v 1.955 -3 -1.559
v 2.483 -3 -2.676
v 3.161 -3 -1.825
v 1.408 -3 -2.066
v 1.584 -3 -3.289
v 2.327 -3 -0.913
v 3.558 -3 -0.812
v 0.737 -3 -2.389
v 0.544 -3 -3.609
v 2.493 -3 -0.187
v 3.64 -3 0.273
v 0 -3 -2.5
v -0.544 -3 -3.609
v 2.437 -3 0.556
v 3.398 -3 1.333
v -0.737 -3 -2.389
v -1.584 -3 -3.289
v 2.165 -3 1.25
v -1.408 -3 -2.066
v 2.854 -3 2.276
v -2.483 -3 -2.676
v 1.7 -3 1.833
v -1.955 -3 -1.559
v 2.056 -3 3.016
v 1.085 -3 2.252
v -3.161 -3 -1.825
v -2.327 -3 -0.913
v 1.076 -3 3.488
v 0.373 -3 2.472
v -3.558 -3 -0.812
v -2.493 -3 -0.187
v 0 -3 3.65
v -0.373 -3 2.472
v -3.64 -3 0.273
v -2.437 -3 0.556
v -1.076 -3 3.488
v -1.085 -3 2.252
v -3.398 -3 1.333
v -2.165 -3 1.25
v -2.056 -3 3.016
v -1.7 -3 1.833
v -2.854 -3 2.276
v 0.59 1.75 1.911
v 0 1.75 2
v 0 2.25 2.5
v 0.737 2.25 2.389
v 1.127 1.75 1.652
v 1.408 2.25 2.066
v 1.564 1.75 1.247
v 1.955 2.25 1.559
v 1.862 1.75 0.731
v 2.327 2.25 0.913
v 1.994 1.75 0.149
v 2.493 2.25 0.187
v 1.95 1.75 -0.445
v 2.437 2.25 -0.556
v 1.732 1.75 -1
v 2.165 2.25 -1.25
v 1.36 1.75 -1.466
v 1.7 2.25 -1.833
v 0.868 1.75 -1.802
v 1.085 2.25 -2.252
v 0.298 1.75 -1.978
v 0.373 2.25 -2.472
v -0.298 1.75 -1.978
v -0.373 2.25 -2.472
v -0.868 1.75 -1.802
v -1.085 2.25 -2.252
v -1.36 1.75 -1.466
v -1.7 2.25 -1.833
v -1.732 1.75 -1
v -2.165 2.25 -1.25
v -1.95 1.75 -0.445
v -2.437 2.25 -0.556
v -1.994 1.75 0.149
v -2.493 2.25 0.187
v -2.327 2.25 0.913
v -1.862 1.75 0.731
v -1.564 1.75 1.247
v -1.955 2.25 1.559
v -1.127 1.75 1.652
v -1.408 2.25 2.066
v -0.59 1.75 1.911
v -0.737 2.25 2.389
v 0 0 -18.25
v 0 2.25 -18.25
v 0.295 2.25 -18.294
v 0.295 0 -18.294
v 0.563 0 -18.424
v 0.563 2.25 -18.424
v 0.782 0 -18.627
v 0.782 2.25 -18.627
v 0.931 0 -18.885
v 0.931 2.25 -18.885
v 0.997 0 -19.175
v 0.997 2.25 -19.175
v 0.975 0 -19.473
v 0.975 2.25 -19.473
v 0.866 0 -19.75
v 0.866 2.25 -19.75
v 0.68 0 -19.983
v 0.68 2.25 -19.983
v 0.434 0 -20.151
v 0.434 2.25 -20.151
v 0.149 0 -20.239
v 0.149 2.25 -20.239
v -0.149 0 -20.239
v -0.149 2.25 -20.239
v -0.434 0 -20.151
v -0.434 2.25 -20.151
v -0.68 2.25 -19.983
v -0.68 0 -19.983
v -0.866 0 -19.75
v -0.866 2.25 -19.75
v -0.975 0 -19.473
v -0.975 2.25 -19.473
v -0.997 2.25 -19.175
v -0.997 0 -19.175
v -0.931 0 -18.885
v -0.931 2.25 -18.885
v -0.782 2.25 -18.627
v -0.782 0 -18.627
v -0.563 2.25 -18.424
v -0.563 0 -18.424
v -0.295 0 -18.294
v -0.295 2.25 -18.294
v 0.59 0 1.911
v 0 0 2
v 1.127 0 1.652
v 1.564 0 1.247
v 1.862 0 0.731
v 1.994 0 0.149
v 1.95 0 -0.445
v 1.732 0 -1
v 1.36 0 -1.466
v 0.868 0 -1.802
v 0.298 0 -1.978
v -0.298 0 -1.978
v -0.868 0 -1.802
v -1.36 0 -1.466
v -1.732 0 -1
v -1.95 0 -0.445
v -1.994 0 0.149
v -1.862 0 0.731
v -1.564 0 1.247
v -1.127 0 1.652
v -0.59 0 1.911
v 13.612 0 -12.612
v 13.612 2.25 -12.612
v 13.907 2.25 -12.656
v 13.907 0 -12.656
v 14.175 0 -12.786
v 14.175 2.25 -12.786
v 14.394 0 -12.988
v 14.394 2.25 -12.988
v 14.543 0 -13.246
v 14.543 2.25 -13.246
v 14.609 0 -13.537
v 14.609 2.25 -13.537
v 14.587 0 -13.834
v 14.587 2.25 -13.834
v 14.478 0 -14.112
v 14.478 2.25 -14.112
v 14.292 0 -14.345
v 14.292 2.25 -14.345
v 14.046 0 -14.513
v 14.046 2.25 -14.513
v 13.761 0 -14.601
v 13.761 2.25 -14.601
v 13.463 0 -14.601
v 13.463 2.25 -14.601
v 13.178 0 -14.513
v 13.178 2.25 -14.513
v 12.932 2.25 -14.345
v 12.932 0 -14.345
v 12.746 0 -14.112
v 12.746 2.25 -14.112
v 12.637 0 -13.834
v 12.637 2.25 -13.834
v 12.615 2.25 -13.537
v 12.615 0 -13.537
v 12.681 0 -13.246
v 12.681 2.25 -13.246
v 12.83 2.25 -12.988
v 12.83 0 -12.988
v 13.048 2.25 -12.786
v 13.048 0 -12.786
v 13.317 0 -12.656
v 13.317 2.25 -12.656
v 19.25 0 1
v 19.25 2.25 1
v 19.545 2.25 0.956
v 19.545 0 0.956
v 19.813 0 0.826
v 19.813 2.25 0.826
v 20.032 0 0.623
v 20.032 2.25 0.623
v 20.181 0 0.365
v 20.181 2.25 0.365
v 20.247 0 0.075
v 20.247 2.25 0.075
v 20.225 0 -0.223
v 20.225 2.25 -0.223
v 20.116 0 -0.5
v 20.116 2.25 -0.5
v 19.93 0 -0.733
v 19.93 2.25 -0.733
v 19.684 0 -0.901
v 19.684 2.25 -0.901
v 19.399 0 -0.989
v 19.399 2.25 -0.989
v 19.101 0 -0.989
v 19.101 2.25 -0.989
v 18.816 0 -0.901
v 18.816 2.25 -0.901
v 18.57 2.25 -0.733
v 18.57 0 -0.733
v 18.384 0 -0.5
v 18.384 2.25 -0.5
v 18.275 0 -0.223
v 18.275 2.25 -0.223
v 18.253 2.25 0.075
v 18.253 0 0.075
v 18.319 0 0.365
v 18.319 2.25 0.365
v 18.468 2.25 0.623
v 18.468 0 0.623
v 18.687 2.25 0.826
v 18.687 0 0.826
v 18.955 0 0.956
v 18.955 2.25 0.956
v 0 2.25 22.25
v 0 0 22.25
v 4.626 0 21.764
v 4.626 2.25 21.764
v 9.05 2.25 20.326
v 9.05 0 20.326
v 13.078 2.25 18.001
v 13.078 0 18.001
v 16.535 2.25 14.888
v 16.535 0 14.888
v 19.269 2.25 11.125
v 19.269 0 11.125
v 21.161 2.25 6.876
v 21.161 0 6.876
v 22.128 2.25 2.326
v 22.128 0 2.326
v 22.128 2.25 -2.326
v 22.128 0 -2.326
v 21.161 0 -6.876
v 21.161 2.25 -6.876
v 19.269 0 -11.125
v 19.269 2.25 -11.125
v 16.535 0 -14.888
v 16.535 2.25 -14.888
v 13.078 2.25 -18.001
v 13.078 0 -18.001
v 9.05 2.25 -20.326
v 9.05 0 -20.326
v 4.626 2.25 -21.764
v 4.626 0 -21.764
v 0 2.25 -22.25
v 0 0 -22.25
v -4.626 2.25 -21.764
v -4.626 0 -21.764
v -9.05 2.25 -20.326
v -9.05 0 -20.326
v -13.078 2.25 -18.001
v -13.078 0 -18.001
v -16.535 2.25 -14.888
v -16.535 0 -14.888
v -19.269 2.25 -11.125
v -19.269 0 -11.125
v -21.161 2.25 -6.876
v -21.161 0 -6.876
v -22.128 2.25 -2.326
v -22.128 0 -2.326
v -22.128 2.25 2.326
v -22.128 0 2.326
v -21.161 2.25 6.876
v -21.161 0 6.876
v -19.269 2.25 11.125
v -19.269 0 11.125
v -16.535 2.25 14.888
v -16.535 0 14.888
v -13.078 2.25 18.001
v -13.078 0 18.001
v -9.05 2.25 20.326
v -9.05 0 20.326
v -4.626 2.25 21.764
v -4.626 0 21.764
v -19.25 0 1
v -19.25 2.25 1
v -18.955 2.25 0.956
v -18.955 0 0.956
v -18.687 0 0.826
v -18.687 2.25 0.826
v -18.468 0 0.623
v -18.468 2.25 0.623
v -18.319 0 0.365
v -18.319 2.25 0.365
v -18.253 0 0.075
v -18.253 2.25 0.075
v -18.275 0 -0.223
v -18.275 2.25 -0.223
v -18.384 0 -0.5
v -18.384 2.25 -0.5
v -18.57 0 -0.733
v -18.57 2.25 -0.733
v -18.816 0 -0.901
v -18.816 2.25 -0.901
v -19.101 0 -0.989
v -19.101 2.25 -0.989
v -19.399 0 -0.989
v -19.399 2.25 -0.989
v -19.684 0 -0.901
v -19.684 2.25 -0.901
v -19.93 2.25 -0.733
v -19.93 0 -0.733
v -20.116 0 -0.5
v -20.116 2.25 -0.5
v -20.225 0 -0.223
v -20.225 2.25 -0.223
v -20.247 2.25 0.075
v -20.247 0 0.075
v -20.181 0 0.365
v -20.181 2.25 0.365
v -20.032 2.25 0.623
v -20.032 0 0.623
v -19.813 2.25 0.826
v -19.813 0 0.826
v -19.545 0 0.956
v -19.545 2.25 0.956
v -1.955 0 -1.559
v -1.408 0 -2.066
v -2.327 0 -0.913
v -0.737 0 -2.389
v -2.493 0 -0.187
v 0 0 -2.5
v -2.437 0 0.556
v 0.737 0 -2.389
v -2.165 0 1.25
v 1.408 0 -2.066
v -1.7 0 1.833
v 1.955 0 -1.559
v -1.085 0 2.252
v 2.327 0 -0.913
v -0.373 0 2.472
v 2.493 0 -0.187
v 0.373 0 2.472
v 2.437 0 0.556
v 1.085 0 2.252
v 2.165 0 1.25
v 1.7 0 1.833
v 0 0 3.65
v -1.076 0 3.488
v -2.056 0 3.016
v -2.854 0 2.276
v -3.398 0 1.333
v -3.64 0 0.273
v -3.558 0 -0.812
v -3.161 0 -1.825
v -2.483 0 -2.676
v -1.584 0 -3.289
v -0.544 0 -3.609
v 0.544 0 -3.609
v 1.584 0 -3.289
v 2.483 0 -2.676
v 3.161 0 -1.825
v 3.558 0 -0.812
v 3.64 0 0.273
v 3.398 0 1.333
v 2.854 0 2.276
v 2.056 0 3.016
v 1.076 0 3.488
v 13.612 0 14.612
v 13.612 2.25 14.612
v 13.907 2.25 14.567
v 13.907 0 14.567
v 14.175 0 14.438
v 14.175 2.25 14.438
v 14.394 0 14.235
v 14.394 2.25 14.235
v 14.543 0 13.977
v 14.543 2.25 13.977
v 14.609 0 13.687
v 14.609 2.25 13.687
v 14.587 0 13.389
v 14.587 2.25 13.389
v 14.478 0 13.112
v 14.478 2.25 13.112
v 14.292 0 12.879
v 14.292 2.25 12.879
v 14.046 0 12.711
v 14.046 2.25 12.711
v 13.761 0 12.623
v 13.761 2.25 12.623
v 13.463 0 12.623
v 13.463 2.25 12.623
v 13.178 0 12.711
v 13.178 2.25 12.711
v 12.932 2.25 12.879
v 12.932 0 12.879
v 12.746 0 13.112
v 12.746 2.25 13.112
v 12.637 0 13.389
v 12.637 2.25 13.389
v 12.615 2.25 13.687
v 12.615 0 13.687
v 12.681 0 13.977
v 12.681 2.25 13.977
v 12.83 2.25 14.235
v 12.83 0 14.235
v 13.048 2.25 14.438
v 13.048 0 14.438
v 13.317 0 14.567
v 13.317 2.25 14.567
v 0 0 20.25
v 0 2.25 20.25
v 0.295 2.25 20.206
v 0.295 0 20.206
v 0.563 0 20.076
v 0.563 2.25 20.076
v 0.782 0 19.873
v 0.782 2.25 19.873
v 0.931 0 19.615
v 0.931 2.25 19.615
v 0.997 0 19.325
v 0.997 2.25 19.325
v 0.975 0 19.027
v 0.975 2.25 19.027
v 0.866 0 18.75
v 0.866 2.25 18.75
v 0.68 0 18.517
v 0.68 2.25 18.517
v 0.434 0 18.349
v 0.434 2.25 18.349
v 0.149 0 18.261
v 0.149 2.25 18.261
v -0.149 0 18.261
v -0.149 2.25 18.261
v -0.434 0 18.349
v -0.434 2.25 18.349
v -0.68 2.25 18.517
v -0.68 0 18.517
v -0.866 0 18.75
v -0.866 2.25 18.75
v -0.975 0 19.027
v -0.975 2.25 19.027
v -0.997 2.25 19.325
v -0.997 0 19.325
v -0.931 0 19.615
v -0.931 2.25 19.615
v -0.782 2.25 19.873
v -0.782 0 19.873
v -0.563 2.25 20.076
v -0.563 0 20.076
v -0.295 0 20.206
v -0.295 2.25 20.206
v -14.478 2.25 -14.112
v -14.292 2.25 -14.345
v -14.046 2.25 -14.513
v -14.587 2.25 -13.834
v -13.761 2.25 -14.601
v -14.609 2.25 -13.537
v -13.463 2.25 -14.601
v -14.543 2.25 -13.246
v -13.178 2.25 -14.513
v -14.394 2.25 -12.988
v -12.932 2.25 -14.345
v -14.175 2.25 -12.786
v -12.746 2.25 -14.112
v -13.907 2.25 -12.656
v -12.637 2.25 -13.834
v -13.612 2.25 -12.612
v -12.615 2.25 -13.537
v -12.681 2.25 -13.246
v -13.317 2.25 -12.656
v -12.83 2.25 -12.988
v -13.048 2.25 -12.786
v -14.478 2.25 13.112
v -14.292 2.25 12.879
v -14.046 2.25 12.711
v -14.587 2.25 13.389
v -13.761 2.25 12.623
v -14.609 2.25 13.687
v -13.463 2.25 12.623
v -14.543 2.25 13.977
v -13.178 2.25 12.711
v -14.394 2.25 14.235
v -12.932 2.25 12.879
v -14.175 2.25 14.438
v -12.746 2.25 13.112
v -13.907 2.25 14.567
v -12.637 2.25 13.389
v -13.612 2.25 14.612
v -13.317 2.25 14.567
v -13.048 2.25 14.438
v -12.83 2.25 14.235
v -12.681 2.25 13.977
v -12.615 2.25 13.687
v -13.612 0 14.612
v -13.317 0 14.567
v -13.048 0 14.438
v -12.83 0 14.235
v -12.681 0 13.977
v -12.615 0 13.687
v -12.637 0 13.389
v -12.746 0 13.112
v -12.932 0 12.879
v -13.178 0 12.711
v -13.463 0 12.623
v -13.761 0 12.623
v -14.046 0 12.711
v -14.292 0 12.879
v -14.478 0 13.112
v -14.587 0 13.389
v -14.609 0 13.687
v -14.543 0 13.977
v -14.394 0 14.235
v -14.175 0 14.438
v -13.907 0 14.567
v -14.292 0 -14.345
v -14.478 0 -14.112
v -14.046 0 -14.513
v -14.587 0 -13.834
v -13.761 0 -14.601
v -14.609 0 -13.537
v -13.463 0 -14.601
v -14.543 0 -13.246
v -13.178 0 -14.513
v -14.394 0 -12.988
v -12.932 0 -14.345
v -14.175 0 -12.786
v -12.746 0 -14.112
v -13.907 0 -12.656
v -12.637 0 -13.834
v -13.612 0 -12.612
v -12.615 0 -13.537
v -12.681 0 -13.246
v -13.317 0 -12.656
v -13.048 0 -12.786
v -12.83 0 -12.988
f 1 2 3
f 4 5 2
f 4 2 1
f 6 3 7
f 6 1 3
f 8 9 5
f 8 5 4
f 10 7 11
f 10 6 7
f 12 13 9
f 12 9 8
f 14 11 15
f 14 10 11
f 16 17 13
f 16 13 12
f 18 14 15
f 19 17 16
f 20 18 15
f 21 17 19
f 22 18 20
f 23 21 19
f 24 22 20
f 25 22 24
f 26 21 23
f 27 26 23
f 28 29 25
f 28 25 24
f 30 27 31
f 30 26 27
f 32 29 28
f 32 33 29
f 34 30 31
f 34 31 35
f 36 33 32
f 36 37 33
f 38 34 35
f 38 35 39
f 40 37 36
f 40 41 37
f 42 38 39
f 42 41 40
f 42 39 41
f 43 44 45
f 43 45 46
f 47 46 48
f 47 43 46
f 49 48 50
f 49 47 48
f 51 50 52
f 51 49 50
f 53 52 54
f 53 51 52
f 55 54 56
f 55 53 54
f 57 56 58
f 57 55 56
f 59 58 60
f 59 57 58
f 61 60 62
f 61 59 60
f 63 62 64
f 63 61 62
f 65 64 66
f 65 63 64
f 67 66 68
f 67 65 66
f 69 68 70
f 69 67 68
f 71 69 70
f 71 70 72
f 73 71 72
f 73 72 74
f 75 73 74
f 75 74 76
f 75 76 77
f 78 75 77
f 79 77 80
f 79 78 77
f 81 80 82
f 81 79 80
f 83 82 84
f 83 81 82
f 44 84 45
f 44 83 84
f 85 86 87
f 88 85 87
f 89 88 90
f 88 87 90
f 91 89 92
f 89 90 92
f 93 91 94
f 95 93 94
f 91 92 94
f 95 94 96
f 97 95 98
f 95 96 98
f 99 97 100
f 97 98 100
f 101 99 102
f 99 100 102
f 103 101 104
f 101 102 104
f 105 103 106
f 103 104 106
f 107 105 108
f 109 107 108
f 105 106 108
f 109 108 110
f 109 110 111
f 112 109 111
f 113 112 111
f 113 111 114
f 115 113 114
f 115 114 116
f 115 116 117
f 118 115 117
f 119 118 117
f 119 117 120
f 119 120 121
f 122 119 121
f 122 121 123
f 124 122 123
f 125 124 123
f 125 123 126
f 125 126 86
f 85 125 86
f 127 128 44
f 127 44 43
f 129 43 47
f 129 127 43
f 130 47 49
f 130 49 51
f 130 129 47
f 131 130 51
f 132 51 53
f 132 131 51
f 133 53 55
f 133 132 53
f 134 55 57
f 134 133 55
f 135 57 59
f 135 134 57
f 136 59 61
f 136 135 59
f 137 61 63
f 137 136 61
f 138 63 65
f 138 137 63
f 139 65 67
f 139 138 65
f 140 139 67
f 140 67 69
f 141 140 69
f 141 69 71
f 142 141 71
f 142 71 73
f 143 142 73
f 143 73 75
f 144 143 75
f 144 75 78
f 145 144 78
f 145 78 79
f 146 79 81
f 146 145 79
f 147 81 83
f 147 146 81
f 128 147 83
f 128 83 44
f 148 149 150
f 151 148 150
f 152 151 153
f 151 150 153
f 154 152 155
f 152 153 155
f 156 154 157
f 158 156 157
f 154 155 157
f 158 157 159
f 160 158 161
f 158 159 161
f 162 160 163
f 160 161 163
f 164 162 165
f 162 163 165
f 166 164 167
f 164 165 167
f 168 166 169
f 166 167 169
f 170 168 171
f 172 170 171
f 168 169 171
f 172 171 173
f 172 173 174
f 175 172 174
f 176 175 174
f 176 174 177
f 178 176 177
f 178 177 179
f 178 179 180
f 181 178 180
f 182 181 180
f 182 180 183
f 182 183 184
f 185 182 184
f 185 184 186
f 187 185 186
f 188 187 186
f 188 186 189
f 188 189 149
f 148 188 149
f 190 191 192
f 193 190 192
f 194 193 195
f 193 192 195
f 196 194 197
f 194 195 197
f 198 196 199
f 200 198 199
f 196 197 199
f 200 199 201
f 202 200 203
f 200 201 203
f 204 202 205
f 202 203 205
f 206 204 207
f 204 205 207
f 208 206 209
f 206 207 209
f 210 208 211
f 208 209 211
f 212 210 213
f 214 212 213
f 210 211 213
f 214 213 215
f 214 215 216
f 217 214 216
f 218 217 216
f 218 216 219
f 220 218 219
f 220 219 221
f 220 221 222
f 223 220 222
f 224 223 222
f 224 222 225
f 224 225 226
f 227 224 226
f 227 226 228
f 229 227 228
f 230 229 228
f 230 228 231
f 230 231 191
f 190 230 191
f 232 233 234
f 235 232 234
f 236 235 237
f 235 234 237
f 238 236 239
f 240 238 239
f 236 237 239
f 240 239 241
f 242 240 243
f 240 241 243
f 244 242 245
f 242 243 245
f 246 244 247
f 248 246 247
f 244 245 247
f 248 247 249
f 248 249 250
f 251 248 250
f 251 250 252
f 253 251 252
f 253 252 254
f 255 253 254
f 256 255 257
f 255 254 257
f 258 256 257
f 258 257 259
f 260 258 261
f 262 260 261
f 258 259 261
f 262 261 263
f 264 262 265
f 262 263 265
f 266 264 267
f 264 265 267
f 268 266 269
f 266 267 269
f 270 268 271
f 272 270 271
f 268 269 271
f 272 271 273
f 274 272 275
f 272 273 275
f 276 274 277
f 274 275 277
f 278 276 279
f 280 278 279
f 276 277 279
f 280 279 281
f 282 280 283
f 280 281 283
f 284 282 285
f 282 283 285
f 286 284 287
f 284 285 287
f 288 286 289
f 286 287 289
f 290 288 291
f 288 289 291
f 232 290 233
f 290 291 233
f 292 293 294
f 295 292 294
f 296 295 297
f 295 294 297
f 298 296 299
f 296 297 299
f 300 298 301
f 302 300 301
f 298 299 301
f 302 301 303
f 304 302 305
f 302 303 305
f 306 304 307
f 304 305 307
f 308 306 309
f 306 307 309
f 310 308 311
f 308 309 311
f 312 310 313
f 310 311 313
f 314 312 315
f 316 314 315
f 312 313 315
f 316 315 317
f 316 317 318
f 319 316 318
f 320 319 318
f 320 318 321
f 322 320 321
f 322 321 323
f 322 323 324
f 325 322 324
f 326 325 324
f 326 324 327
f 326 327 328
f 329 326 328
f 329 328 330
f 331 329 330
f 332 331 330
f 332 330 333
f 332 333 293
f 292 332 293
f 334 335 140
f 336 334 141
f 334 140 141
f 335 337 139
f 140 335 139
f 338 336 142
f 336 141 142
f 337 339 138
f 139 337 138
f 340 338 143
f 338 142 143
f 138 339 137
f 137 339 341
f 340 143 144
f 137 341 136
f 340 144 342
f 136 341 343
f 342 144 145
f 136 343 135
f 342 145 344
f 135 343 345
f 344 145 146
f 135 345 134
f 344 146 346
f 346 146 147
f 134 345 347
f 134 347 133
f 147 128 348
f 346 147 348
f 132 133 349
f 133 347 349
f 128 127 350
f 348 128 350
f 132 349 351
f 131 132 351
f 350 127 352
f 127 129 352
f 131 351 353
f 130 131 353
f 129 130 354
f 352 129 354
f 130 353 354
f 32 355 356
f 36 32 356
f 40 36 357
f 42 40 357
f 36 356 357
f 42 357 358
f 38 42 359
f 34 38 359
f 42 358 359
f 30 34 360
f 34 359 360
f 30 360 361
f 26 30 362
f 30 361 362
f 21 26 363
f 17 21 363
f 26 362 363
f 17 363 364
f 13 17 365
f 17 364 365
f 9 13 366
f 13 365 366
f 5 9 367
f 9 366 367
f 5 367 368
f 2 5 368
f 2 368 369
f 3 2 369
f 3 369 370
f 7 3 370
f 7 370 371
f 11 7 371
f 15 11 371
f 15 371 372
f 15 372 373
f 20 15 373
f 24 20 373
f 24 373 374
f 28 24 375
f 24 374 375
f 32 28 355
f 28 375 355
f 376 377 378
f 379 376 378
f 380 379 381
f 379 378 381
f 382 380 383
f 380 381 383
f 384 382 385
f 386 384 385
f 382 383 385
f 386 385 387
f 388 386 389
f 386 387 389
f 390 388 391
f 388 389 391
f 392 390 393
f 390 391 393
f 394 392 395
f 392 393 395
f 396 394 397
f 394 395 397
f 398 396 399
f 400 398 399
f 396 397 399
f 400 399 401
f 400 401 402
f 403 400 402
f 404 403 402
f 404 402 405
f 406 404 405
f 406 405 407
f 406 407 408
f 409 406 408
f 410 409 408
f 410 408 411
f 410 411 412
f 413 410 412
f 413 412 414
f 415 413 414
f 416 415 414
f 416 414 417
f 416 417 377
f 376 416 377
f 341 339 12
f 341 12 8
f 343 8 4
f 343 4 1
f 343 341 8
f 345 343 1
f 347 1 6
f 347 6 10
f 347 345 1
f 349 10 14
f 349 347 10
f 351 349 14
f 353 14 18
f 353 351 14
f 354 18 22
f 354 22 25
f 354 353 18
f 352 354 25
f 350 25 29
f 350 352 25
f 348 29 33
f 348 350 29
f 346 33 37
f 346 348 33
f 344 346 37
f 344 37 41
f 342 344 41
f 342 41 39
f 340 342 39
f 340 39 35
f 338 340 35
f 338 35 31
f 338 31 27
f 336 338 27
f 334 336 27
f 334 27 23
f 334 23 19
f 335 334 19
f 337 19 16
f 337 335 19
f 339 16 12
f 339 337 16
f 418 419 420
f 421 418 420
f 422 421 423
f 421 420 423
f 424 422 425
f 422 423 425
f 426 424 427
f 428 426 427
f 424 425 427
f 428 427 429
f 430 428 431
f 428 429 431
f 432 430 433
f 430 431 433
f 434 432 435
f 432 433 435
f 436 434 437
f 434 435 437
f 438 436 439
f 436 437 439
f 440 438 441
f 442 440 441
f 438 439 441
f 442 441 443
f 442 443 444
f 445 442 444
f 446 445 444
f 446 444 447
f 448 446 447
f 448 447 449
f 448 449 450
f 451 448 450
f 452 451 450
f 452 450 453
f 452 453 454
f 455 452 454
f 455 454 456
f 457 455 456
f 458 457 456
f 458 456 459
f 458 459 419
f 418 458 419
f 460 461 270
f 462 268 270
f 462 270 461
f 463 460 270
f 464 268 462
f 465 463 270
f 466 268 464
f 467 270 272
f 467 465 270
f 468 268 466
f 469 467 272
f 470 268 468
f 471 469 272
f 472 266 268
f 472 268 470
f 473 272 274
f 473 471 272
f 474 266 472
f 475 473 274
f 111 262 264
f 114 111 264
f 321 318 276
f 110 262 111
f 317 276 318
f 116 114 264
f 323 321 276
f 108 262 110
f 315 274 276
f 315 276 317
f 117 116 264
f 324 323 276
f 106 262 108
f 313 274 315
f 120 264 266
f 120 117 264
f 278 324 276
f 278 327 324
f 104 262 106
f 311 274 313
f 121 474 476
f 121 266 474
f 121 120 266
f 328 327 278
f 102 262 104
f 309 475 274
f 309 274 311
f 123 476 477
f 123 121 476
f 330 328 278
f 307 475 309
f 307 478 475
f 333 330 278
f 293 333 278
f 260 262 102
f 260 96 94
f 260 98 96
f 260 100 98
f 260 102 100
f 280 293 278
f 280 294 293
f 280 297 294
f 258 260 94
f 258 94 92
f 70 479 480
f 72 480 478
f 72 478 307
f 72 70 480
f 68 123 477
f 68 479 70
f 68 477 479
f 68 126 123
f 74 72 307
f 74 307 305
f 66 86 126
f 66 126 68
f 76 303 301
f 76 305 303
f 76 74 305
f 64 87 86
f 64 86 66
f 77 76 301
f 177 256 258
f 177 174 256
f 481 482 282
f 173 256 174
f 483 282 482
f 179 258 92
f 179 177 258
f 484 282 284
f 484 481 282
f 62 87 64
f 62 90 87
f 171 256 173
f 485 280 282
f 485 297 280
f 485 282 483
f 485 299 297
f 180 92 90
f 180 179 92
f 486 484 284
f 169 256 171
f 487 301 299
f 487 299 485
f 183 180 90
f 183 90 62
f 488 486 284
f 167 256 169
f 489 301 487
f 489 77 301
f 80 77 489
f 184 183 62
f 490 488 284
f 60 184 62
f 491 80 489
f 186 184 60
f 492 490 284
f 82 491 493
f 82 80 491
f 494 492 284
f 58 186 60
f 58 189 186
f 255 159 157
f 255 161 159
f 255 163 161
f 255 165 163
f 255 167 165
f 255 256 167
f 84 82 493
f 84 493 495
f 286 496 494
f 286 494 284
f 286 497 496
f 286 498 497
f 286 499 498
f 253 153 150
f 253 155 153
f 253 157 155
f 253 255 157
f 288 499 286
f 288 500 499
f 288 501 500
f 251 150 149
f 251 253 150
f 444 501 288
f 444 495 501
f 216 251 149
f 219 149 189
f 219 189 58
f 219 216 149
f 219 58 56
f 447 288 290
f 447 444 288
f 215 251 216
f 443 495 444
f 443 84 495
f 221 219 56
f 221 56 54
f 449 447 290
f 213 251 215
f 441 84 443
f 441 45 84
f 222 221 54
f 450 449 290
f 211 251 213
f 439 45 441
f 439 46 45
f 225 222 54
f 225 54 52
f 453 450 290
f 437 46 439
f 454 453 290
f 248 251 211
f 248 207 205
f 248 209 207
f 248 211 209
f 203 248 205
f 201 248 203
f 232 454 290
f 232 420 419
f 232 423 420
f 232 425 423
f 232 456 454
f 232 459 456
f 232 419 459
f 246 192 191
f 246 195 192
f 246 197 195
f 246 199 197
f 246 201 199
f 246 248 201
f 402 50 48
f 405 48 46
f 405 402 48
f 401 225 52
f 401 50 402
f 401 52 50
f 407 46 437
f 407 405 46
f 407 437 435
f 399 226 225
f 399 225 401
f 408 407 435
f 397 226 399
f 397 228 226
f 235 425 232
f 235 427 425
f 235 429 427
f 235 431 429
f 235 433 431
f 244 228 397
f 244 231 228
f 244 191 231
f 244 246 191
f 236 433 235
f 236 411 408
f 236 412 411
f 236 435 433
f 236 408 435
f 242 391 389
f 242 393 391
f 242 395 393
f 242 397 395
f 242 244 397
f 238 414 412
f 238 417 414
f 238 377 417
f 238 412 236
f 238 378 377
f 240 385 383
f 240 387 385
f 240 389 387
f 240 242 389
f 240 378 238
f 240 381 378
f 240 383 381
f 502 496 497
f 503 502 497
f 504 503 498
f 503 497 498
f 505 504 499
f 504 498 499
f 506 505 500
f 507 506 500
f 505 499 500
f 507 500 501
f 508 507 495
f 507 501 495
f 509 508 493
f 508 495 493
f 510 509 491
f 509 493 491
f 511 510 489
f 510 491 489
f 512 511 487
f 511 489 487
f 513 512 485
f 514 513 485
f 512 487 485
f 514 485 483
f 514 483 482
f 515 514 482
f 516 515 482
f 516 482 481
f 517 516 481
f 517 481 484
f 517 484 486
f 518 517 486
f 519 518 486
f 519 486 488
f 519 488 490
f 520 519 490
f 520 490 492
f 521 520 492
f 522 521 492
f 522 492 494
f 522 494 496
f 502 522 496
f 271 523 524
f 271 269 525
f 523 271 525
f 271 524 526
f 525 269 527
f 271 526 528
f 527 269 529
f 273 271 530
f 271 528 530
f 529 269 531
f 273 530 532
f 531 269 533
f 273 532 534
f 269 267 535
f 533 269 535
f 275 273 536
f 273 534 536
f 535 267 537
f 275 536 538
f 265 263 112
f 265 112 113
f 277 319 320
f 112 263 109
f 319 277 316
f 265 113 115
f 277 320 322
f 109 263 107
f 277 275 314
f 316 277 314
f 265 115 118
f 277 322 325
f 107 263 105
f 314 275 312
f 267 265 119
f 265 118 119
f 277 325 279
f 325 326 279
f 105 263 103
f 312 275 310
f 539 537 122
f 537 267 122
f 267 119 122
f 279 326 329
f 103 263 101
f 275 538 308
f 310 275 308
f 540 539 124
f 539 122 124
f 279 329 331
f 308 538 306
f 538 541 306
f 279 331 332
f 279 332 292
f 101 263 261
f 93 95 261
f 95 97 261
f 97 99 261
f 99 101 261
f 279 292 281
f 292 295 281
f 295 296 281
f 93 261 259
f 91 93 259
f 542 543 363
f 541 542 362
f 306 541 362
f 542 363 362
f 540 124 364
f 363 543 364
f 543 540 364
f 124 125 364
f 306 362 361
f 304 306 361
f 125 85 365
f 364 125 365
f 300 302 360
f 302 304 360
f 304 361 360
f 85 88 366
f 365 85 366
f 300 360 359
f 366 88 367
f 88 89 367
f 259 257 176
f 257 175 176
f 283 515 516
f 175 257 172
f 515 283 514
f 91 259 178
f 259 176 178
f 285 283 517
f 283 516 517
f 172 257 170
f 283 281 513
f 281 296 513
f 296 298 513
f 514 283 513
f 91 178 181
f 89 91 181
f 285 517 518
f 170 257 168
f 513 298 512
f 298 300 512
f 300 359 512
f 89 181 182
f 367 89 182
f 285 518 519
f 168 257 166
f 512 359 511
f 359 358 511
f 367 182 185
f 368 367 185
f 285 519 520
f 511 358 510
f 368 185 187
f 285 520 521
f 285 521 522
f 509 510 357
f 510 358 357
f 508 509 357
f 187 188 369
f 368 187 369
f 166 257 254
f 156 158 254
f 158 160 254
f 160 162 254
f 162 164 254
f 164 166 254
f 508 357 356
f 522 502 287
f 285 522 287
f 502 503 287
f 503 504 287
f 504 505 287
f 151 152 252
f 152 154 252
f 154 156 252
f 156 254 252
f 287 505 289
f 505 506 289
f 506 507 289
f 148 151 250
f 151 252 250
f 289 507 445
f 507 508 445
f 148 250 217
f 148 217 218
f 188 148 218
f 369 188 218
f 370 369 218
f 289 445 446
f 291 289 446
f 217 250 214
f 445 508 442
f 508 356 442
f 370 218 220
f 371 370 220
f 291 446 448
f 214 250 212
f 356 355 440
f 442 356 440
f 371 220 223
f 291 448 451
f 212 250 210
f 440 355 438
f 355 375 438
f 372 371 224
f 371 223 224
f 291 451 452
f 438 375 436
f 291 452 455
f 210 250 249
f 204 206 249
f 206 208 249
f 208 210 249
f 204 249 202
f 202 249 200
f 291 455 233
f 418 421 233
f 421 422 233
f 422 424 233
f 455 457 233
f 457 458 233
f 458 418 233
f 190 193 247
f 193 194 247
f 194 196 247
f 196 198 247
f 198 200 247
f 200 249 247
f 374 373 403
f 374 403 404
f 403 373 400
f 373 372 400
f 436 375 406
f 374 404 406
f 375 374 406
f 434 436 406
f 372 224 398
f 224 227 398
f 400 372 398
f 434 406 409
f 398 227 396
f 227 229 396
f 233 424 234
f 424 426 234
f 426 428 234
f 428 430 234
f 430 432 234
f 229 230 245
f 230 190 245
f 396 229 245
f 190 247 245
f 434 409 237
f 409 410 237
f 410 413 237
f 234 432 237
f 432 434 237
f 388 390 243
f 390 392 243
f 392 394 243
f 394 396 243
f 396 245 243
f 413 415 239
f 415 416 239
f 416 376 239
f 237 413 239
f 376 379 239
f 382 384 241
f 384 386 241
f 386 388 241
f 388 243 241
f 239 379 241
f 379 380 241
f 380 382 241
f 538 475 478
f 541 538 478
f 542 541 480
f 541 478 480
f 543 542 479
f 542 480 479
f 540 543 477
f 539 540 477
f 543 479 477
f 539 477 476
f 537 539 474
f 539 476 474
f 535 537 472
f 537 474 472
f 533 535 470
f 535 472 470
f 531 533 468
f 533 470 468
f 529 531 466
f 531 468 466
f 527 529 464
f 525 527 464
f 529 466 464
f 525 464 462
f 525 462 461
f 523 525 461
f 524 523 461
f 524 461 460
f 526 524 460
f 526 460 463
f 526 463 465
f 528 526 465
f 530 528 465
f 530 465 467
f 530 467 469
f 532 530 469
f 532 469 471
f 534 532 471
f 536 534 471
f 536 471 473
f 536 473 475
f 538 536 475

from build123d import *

# Parameters (mm, degrees)
SKETCH_1_R          = 22.25
SKETCH_1_R_2        = 2
EXTRUDE_1_DEPTH     = 2.25
SKETCH_3_R          = 3.65
SKETCH_3_R_2        = 2.5
EXTRUDE_2_DEPTH     = 3
CHAMFER_1_SIZE      = 0.5
SKETCH_4_R          = 1
CUT_EXTRUDE_3_DEPTH = 32.90121471


with BuildPart() as part:
    # Эскиз1 → Вытянуть1 (new body)
    with BuildSketch(Plane(origin=(0, 0, 0), x_dir=(1, 0, 0), z_dir=(0, 1, 0))):
        with Locations(Location((0, 0, 0), (0, 0, 270))):
            Circle(SKETCH_1_R)
        with Locations(Location((0, 0, 0), (0, 0, 270))):
            Circle(SKETCH_1_R_2, mode=Mode.SUBTRACT)
    extrude(amount=EXTRUDE_1_DEPTH)

    # Эскиз3 → Вытянуть2 (add)
    with BuildSketch(Plane.XZ):
        with Locations(Location((0, 0, 0), (0, 0, 90))):
            Circle(SKETCH_3_R)
        with Locations(Location((0, 0, 0), (0, 0, 270))):
            Circle(SKETCH_3_R_2, mode=Mode.SUBTRACT)
    extrude(amount=EXTRUDE_2_DEPTH)

    # Фаска1
    chamfer_1_edges = [part.edges().sort_by_distance(p)[0] for p in [
        (0, 2.25, -2),
    ]]
    chamfer(chamfer_1_edges, length=CHAMFER_1_SIZE)

    # Эскиз4 → Вытянуть3 (cut, through all)
    with BuildSketch(Plane(origin=(0, 2.25, 0), x_dir=(1, 0, 0), z_dir=(0, 1, 0))):
        with Locations(Location((0, 19.25, 0), (0, 0, 270))):
            Circle(SKETCH_4_R)
        with Locations(Location((13.611805538, 13.611805538, 0), (0, 0, 270))):
            Circle(SKETCH_4_R)
        with Locations(Location((19.25, 0, 0), (0, 0, 270))):
            Circle(SKETCH_4_R)
        with Locations(Location((13.611805538, -13.611805538, 0), (0, 0, 270))):
            Circle(SKETCH_4_R)
        with Locations(Location((0, -19.25, 0), (0, 0, 270))):
            Circle(SKETCH_4_R)
        with Locations(Location((-13.611805538, -13.611805538, 0), (0, 0, 270))):
            Circle(SKETCH_4_R)
        with Locations(Location((-19.25, 0, 0), (0, 0, 270))):
            Circle(SKETCH_4_R)
        with Locations(Location((-13.611805538, 13.611805538, 0), (0, 0, 270))):
            Circle(SKETCH_4_R)
    extrude(amount=-CUT_EXTRUDE_3_DEPTH, mode=Mode.SUBTRACT)


solid = part.part
